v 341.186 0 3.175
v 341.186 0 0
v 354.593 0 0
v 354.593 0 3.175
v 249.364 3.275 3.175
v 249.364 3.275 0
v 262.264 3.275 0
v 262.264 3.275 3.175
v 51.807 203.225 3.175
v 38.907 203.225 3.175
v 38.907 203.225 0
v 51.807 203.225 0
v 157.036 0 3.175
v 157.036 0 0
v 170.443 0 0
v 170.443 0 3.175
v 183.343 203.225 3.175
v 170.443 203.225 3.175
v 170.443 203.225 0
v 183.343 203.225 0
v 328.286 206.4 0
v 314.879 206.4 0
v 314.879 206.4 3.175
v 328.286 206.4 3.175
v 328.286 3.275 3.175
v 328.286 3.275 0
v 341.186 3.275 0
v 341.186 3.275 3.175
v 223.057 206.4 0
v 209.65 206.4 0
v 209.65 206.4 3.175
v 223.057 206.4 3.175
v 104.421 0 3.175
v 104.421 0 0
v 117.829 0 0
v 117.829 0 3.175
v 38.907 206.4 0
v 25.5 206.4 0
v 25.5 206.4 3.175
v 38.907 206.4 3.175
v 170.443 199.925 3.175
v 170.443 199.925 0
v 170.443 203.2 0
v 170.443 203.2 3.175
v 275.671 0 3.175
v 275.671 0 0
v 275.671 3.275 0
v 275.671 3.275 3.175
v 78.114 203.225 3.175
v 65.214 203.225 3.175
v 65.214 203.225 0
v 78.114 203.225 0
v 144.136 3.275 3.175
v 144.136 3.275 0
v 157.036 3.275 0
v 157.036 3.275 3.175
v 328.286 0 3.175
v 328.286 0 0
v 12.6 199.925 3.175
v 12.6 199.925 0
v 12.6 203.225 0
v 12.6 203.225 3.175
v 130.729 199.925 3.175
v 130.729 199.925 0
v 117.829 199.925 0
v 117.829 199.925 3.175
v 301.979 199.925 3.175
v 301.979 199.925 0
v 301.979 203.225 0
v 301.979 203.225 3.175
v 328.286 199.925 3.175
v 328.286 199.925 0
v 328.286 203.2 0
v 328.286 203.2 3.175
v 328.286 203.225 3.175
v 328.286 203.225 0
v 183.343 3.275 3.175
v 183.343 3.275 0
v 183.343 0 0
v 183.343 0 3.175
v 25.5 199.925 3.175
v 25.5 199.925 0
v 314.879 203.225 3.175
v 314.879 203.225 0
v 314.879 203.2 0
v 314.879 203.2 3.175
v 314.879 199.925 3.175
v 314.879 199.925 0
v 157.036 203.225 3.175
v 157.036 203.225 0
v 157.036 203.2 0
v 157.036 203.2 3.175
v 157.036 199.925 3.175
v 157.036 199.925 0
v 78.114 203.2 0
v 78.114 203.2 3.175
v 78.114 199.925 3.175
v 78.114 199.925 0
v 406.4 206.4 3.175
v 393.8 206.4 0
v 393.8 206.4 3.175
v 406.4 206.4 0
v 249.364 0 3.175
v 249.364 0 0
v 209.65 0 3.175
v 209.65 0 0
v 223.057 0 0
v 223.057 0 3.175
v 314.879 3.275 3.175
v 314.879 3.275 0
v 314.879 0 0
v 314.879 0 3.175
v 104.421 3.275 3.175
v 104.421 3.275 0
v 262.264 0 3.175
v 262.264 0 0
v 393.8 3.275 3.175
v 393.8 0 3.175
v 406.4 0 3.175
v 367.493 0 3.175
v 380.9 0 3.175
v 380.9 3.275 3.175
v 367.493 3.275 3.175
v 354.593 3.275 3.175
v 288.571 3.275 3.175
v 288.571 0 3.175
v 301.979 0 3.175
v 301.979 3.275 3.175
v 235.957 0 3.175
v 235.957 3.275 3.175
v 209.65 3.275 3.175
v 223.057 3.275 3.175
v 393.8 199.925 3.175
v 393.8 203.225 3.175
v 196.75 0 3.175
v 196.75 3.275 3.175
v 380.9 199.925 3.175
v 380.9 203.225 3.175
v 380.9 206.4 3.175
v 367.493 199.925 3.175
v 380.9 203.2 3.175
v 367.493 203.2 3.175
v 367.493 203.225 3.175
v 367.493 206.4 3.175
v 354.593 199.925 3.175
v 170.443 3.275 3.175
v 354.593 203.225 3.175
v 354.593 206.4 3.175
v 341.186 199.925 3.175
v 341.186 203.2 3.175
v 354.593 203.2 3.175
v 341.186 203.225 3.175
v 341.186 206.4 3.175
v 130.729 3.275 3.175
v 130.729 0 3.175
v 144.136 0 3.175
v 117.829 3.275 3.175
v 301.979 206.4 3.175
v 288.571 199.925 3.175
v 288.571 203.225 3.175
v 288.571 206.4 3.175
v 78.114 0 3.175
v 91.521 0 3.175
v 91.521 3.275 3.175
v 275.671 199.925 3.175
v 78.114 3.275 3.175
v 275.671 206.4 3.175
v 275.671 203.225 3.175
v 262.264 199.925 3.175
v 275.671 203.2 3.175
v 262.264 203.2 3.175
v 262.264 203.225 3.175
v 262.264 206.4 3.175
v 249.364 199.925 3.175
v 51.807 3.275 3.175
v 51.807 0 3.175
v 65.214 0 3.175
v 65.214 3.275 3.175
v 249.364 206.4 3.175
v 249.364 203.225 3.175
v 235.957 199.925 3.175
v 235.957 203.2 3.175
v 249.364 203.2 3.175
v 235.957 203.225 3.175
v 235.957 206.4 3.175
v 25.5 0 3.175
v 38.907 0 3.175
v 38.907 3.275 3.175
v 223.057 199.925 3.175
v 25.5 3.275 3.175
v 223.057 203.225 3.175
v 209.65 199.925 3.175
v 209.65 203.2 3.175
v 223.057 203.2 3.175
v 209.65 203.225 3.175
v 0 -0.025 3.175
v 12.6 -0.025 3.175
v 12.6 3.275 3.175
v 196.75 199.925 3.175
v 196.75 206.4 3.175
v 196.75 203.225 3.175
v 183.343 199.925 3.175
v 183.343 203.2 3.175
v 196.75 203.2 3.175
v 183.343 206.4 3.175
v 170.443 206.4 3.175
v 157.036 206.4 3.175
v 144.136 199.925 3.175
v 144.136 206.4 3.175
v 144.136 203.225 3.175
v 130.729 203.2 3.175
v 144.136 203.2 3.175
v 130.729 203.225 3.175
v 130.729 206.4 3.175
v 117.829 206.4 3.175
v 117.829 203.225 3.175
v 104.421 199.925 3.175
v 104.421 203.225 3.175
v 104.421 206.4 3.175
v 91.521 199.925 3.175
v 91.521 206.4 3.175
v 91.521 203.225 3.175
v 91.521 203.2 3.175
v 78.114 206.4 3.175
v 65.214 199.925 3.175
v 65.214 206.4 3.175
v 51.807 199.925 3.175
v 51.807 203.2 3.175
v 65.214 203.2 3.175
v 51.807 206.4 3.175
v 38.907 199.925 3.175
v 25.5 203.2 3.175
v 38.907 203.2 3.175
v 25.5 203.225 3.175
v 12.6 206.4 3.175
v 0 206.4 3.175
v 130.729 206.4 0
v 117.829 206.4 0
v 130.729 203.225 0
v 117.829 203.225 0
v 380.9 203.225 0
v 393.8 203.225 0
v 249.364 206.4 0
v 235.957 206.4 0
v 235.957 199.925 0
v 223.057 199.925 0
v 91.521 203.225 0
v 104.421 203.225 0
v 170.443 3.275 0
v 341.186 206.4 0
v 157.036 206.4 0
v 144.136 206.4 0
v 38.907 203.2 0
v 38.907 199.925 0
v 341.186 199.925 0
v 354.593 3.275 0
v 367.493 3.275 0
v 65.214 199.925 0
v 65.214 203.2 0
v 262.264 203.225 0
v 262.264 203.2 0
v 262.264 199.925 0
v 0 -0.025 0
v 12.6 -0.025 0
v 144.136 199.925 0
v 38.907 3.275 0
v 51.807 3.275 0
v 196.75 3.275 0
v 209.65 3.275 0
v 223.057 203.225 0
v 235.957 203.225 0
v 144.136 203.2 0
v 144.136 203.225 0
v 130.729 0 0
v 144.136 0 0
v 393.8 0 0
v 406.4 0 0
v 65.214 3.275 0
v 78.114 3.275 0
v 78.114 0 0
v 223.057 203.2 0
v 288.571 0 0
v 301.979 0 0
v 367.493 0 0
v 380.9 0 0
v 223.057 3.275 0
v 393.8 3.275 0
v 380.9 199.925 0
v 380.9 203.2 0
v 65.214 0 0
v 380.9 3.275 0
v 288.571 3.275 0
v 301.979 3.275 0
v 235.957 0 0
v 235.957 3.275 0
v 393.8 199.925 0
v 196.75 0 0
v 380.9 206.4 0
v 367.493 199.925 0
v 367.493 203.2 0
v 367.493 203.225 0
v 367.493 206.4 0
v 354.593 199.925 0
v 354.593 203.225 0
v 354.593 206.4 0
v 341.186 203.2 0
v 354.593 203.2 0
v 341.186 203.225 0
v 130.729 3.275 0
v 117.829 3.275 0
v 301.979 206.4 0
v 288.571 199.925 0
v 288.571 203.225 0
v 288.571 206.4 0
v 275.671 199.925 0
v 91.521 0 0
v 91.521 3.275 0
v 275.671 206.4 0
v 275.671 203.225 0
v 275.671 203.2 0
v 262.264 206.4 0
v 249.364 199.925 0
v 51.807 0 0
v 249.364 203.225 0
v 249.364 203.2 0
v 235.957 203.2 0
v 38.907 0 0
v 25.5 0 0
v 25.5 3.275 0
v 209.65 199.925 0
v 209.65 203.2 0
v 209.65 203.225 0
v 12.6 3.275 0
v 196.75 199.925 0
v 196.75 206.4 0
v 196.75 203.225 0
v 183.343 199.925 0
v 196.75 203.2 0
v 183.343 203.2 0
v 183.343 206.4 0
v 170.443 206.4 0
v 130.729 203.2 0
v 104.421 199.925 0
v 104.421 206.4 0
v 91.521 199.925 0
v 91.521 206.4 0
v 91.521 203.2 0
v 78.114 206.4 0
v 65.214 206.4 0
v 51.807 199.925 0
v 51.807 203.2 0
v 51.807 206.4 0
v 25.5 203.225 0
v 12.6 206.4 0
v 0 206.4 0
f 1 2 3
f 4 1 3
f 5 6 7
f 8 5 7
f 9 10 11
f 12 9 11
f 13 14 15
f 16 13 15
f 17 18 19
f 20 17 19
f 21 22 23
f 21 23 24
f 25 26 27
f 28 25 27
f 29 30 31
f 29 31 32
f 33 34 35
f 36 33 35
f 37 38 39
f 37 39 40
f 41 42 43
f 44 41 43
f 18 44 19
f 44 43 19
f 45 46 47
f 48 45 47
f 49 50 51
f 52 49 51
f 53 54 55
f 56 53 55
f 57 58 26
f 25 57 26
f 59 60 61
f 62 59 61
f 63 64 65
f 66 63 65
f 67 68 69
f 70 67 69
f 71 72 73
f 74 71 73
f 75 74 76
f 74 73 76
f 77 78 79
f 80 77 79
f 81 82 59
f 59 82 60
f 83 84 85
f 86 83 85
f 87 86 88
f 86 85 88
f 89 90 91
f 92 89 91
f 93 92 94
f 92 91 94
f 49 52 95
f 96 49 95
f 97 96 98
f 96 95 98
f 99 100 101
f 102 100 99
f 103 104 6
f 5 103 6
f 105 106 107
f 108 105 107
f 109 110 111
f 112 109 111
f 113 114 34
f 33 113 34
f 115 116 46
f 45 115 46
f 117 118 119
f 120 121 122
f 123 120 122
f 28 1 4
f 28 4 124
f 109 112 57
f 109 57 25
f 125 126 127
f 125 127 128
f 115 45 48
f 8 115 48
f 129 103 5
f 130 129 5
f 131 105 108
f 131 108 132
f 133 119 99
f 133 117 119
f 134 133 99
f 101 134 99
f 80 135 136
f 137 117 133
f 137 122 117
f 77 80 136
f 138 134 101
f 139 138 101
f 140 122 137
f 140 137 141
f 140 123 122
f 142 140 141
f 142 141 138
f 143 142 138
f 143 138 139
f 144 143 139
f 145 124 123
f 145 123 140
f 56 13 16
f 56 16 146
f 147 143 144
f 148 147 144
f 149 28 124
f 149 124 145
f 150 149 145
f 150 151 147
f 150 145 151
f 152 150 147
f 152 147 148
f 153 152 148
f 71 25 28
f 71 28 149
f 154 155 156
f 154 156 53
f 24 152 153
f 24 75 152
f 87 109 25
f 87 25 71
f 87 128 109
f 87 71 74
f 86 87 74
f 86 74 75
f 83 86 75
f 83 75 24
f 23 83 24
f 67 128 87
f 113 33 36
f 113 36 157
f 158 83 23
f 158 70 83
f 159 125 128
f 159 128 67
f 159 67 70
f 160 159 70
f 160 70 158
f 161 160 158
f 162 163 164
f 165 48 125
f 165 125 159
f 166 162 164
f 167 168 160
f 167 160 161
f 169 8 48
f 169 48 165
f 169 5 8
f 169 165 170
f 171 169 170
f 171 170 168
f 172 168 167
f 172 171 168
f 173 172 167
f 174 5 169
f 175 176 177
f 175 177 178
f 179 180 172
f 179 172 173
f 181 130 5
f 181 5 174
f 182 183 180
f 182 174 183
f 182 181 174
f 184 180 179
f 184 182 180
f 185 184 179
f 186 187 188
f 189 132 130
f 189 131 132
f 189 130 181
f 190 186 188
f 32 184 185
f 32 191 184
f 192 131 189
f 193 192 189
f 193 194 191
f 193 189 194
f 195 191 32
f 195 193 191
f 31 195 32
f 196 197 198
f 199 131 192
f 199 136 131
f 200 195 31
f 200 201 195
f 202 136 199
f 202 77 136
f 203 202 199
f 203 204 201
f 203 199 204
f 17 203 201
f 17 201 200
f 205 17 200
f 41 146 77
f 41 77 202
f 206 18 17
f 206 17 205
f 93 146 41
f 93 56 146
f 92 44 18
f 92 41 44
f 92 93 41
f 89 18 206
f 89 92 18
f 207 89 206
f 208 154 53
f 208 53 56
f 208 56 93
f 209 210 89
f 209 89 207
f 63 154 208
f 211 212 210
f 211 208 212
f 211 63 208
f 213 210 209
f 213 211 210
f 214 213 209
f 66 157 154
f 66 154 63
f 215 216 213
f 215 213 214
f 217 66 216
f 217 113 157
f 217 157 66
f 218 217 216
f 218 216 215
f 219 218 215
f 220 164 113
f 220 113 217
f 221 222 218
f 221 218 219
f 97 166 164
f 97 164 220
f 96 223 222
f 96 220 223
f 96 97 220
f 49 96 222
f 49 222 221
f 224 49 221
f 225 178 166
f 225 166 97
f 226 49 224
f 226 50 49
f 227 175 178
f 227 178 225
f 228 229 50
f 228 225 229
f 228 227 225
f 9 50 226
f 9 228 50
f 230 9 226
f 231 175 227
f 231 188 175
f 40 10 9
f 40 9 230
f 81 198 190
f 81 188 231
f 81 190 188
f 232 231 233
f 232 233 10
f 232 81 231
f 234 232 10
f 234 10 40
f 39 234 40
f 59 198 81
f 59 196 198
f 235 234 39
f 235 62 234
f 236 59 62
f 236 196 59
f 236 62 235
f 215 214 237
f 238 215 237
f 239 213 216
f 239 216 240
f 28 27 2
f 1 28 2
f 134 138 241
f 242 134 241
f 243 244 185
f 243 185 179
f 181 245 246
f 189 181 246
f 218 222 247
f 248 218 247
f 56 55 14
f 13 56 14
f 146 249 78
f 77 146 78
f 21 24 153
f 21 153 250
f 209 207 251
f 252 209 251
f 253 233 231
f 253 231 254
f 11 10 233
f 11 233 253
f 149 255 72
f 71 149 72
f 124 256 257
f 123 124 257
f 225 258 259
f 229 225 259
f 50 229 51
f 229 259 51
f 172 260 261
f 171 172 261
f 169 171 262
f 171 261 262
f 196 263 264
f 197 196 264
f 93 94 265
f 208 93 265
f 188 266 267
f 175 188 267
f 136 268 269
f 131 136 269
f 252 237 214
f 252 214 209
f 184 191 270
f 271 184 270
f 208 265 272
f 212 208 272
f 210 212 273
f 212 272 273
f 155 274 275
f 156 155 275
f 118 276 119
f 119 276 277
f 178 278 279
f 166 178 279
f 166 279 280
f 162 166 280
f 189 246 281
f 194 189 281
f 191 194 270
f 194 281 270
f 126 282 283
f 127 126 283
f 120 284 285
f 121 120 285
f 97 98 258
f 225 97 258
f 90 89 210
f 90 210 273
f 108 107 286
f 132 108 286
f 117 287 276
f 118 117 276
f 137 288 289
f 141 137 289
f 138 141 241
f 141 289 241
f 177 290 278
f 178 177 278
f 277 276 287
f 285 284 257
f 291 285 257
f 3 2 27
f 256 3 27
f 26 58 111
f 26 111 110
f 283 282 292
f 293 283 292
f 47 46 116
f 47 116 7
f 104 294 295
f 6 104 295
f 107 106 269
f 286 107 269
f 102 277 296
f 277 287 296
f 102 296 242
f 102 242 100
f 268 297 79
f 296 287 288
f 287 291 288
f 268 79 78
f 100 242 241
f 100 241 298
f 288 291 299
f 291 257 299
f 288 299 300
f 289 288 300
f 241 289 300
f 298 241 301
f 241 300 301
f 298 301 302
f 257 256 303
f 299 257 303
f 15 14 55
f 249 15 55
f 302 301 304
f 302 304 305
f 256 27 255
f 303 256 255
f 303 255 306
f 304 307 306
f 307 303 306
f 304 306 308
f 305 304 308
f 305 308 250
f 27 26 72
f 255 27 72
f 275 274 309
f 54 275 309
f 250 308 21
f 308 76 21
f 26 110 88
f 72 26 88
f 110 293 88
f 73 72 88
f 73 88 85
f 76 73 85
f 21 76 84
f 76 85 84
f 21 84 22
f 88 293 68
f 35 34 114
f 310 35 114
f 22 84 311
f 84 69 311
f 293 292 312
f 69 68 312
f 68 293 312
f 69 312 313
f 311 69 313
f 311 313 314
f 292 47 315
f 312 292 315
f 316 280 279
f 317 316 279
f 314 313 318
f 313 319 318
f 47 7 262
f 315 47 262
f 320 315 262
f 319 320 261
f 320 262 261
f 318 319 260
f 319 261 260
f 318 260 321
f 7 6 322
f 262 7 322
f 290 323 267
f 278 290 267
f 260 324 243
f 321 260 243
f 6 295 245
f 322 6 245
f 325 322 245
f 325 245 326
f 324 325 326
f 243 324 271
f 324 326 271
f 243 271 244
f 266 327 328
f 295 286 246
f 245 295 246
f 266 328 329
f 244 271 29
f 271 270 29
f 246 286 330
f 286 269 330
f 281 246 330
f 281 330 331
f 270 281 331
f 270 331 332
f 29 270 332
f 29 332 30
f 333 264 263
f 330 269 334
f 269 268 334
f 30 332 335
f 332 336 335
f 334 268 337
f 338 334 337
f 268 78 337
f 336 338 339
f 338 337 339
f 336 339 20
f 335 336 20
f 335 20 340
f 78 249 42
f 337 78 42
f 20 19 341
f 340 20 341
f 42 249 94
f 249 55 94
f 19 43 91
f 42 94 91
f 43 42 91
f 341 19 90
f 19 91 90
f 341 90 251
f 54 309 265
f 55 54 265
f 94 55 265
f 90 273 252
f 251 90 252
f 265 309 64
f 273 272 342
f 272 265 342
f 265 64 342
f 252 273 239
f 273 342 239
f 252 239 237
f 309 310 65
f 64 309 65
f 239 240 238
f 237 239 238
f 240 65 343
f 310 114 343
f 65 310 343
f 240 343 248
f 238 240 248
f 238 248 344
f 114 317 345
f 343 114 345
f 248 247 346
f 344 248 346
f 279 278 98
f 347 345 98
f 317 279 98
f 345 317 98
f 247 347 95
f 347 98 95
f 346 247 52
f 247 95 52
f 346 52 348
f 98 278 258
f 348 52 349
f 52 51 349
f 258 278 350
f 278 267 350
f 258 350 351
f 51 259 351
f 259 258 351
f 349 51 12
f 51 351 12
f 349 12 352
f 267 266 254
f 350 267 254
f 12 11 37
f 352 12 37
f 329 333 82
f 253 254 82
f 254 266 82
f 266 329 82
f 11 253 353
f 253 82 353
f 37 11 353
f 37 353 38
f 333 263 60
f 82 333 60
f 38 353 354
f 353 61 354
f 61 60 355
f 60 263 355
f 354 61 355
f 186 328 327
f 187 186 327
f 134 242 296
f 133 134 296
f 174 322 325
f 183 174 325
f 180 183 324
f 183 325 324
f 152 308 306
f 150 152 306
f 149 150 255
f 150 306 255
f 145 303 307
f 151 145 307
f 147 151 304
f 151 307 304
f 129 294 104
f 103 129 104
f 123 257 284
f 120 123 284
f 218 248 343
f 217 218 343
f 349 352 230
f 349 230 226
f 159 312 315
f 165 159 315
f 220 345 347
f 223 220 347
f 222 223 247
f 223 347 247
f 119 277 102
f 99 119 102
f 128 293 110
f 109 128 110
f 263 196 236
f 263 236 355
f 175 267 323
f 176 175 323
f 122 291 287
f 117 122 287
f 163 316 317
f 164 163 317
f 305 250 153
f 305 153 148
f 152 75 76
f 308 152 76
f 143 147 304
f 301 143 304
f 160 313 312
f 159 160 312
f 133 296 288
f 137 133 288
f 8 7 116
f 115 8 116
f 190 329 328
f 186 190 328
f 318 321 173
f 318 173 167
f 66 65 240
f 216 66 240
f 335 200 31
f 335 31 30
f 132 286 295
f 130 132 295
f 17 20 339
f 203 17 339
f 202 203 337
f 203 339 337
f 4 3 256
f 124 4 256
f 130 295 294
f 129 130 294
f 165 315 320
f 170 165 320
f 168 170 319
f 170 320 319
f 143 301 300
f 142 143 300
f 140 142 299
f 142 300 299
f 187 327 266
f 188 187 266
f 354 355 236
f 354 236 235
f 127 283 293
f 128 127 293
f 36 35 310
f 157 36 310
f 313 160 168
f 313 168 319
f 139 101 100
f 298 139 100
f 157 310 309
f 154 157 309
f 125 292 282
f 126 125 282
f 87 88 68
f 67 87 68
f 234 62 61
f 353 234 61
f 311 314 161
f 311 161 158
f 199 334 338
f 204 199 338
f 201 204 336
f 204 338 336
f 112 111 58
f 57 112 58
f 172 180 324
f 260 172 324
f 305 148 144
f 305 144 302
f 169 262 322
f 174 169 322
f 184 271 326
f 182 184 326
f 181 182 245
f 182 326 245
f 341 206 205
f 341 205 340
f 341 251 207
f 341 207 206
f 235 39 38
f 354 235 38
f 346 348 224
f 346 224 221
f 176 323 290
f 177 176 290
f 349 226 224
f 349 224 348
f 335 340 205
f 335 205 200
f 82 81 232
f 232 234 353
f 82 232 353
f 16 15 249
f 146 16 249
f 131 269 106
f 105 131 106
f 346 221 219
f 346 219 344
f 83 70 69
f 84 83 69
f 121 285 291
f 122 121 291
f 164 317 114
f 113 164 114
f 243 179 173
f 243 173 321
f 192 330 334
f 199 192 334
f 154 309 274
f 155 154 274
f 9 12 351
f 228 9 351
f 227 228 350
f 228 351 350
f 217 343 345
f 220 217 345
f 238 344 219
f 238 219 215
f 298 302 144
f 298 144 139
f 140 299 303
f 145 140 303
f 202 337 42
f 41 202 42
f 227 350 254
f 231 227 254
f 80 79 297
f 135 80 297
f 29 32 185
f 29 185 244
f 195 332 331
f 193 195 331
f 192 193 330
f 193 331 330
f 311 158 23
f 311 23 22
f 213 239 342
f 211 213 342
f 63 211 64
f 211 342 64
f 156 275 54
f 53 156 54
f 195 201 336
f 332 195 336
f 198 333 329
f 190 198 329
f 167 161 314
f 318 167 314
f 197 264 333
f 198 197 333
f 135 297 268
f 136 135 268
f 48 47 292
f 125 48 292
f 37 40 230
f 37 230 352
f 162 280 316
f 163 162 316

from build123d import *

# Parameters (mm, degrees)
BOSS_EXTRUDE1_DEPTH      = 3.175
SKETCH2_W                = 13.407142857
SKETCH2_H                = 3.175
SKETCH2_W_2              = 12.6000002
SKETCH2_W_3              = 13.407142858
SKETCH2_W_4              = 12.6
BOSS_EXTRUDE3_DEPTH      = 3.175
BOSS_EXTRUDE3_DEPTH_BACK = 0.635
SKETCH3_W                = 3.175
SKETCH3_H                = 3.175
BOSS_EXTRUDE4_DEPTH      = 381.2


with BuildPart() as part:
    # Sketch1 → Boss-Extrude1 (new body)
    with BuildSketch(Plane.XY):
        Polygon((393.8, 203.2), (393.8, 199.925), (380.9, 199.925), (380.9, 203.2), (367.492857143, 203.2), (367.492857143, 199.925), (354.592857143, 199.925), (354.592857143, 203.2), (341.185714286, 203.2), (341.185714286, 199.925), (328.285714286, 199.925), (328.285714286, 203.2), (314.878571429, 203.2), (314.878571429, 199.925), (301.978571429, 199.925), (301.978571429, 203.2), (288.571428571, 203.2), (288.571428571, 199.925), (275.671428571, 199.925), (275.671428571, 203.2), (262.264285714, 203.2), (262.264285714, 199.925), (249.364285714, 199.925), (249.364285714, 203.2), (235.957142857, 203.2), (235.957142857, 199.925), (223.057142857, 199.925), (223.057142857, 203.2), (209.65, 203.2), (209.65, 199.925), (196.75, 199.925), (196.75, 203.2), (183.342857143, 203.2), (183.342857143, 199.925), (170.442857143, 199.925), (170.442857143, 203.2), (157.035714286, 203.2), (157.035714286, 199.925), (144.135714286, 199.925), (144.135714286, 203.2), (130.728571429, 203.2), (130.728571429, 199.925), (117.828571429, 199.925), (117.828571429, 203.2), (104.421428571, 203.2), (104.421428571, 199.925), (91.521428571, 199.925), (91.521428571, 203.2), (78.114285714, 203.2), (78.114285714, 199.925), (65.214285714, 199.925), (65.214285714, 203.2), (51.807142857, 203.2), (51.807142857, 199.925), (38.907142857, 199.925), (38.907142857, 203.2), (25.5, 203.2), (25.5, 199.925), (12.6, 199.925), (12.6000002, 203.2254), (0, 203.2254), (0, -0.0254), (12.6000002, -0.0254), (12.6, 3.275), (25.5, 3.275), (25.5, 0), (38.907142857, 0), (38.907142857, 3.275), (51.807142857, 3.275), (51.807142857, 0), (65.214285714, 0), (65.214285714, 3.275), (78.114285714, 3.275), (78.114285714, 0), (91.521428571, 0), (91.521428571, 3.275), (104.421428571, 3.275), (104.421428571, 0), (117.828571429, 0), (117.828571429, 3.275), (130.728571429, 3.275), (130.728571429, 0), (144.135714286, 0), (144.135714286, 3.275), (157.035714286, 3.275), (157.035714286, 0), (170.442857143, 0), (170.442857143, 3.275), (183.342857143, 3.275), (183.342857143, 0), (196.75, 0), (196.75, 3.275), (209.65, 3.275), (209.65, 0), (223.057142857, 0), (223.057142857, 3.275), (235.957142857, 3.275), (235.957142857, 0), (249.364285714, 0), (249.364285714, 3.275), (262.264285714, 3.275), (262.264285714, 0), (275.671428571, 0), (275.671428571, 3.275), (288.571428571, 3.275), (288.571428571, 0), (301.978571429, 0), (301.978571429, 3.275), (314.878571429, 3.275), (314.878571429, 0), (328.285714286, 0), (328.285714286, 3.275), (341.185714286, 3.275), (341.185714286, 0), (354.592857143, 0), (354.592857143, 3.275), (367.492857143, 3.275), (367.492857143, 0), (380.9, 0), (380.9, 3.275), (393.8, 3.275), (393.8, 0), (406.4, 0), (406.4, 203.2), align=None)
    extrude(amount=BOSS_EXTRUDE1_DEPTH)

    # Sketch2 → Boss-Extrude3 (add, two sides)
    with BuildSketch(Plane(origin=(0, 203.2254, 0), x_dir=(1, 0, 0), z_dir=(0, 1, 0))) as boss_extrude3_sk:
        with Locations((32.203571428, -1.5875)):
            Rectangle(SKETCH2_W, SKETCH2_H)
        with Locations((58.510714286, -1.5875)):
            Rectangle(SKETCH2_W, SKETCH2_H)
        with Locations((137.432142857, -1.5875)):
            Rectangle(SKETCH2_W, SKETCH2_H)
        with Locations((163.739285714, -1.5875)):
            Rectangle(SKETCH2_W, SKETCH2_H)
        with Locations((216.353571429, -1.5875)):
            Rectangle(SKETCH2_W, SKETCH2_H)
        with Locations((321.582142858, -1.5875)):
            Rectangle(SKETCH2_W, SKETCH2_H)
        with Locations((6.3000001, -1.5875)):
            Rectangle(SKETCH2_W_2, SKETCH2_H)
        with Locations((84.817857143, -1.5875)):
            Rectangle(SKETCH2_W, SKETCH2_H)
        with Locations((111.125, -1.5875)):
            Rectangle(SKETCH2_W_3, SKETCH2_H)
        with Locations((190.046428572, -1.5875)):
            Rectangle(SKETCH2_W, SKETCH2_H)
        with Locations((242.660714286, -1.5875)):
            Rectangle(SKETCH2_W, SKETCH2_H)
        with Locations((268.967857143, -1.5875)):
            Rectangle(SKETCH2_W, SKETCH2_H)
        with Locations((295.275, -1.5875)):
            Rectangle(SKETCH2_W_3, SKETCH2_H)
        with Locations((347.889285715, -1.5875)):
            Rectangle(SKETCH2_W, SKETCH2_H)
        with Locations((374.196428572, -1.5875)):
            Rectangle(SKETCH2_W, SKETCH2_H)
        with Locations((400.1, -1.5875)):
            Rectangle(SKETCH2_W_4, SKETCH2_H)
    extrude(amount=BOSS_EXTRUDE3_DEPTH)
    extrude(boss_extrude3_sk.sketch, amount=-BOSS_EXTRUDE3_DEPTH_BACK)

    # Sketch3 → Boss-Extrude4 (add)
    with BuildSketch(Plane(origin=(12.599987885, -7.64e-07, 0), x_dir=(0, 0, -1), z_dir=(1, -6.1e-08, 0))):
        with Locations((-1.5875, 204.812900764)):
            Rectangle(SKETCH3_W, SKETCH3_H)
    extrude(amount=BOSS_EXTRUDE4_DEPTH)


solid = part.part
